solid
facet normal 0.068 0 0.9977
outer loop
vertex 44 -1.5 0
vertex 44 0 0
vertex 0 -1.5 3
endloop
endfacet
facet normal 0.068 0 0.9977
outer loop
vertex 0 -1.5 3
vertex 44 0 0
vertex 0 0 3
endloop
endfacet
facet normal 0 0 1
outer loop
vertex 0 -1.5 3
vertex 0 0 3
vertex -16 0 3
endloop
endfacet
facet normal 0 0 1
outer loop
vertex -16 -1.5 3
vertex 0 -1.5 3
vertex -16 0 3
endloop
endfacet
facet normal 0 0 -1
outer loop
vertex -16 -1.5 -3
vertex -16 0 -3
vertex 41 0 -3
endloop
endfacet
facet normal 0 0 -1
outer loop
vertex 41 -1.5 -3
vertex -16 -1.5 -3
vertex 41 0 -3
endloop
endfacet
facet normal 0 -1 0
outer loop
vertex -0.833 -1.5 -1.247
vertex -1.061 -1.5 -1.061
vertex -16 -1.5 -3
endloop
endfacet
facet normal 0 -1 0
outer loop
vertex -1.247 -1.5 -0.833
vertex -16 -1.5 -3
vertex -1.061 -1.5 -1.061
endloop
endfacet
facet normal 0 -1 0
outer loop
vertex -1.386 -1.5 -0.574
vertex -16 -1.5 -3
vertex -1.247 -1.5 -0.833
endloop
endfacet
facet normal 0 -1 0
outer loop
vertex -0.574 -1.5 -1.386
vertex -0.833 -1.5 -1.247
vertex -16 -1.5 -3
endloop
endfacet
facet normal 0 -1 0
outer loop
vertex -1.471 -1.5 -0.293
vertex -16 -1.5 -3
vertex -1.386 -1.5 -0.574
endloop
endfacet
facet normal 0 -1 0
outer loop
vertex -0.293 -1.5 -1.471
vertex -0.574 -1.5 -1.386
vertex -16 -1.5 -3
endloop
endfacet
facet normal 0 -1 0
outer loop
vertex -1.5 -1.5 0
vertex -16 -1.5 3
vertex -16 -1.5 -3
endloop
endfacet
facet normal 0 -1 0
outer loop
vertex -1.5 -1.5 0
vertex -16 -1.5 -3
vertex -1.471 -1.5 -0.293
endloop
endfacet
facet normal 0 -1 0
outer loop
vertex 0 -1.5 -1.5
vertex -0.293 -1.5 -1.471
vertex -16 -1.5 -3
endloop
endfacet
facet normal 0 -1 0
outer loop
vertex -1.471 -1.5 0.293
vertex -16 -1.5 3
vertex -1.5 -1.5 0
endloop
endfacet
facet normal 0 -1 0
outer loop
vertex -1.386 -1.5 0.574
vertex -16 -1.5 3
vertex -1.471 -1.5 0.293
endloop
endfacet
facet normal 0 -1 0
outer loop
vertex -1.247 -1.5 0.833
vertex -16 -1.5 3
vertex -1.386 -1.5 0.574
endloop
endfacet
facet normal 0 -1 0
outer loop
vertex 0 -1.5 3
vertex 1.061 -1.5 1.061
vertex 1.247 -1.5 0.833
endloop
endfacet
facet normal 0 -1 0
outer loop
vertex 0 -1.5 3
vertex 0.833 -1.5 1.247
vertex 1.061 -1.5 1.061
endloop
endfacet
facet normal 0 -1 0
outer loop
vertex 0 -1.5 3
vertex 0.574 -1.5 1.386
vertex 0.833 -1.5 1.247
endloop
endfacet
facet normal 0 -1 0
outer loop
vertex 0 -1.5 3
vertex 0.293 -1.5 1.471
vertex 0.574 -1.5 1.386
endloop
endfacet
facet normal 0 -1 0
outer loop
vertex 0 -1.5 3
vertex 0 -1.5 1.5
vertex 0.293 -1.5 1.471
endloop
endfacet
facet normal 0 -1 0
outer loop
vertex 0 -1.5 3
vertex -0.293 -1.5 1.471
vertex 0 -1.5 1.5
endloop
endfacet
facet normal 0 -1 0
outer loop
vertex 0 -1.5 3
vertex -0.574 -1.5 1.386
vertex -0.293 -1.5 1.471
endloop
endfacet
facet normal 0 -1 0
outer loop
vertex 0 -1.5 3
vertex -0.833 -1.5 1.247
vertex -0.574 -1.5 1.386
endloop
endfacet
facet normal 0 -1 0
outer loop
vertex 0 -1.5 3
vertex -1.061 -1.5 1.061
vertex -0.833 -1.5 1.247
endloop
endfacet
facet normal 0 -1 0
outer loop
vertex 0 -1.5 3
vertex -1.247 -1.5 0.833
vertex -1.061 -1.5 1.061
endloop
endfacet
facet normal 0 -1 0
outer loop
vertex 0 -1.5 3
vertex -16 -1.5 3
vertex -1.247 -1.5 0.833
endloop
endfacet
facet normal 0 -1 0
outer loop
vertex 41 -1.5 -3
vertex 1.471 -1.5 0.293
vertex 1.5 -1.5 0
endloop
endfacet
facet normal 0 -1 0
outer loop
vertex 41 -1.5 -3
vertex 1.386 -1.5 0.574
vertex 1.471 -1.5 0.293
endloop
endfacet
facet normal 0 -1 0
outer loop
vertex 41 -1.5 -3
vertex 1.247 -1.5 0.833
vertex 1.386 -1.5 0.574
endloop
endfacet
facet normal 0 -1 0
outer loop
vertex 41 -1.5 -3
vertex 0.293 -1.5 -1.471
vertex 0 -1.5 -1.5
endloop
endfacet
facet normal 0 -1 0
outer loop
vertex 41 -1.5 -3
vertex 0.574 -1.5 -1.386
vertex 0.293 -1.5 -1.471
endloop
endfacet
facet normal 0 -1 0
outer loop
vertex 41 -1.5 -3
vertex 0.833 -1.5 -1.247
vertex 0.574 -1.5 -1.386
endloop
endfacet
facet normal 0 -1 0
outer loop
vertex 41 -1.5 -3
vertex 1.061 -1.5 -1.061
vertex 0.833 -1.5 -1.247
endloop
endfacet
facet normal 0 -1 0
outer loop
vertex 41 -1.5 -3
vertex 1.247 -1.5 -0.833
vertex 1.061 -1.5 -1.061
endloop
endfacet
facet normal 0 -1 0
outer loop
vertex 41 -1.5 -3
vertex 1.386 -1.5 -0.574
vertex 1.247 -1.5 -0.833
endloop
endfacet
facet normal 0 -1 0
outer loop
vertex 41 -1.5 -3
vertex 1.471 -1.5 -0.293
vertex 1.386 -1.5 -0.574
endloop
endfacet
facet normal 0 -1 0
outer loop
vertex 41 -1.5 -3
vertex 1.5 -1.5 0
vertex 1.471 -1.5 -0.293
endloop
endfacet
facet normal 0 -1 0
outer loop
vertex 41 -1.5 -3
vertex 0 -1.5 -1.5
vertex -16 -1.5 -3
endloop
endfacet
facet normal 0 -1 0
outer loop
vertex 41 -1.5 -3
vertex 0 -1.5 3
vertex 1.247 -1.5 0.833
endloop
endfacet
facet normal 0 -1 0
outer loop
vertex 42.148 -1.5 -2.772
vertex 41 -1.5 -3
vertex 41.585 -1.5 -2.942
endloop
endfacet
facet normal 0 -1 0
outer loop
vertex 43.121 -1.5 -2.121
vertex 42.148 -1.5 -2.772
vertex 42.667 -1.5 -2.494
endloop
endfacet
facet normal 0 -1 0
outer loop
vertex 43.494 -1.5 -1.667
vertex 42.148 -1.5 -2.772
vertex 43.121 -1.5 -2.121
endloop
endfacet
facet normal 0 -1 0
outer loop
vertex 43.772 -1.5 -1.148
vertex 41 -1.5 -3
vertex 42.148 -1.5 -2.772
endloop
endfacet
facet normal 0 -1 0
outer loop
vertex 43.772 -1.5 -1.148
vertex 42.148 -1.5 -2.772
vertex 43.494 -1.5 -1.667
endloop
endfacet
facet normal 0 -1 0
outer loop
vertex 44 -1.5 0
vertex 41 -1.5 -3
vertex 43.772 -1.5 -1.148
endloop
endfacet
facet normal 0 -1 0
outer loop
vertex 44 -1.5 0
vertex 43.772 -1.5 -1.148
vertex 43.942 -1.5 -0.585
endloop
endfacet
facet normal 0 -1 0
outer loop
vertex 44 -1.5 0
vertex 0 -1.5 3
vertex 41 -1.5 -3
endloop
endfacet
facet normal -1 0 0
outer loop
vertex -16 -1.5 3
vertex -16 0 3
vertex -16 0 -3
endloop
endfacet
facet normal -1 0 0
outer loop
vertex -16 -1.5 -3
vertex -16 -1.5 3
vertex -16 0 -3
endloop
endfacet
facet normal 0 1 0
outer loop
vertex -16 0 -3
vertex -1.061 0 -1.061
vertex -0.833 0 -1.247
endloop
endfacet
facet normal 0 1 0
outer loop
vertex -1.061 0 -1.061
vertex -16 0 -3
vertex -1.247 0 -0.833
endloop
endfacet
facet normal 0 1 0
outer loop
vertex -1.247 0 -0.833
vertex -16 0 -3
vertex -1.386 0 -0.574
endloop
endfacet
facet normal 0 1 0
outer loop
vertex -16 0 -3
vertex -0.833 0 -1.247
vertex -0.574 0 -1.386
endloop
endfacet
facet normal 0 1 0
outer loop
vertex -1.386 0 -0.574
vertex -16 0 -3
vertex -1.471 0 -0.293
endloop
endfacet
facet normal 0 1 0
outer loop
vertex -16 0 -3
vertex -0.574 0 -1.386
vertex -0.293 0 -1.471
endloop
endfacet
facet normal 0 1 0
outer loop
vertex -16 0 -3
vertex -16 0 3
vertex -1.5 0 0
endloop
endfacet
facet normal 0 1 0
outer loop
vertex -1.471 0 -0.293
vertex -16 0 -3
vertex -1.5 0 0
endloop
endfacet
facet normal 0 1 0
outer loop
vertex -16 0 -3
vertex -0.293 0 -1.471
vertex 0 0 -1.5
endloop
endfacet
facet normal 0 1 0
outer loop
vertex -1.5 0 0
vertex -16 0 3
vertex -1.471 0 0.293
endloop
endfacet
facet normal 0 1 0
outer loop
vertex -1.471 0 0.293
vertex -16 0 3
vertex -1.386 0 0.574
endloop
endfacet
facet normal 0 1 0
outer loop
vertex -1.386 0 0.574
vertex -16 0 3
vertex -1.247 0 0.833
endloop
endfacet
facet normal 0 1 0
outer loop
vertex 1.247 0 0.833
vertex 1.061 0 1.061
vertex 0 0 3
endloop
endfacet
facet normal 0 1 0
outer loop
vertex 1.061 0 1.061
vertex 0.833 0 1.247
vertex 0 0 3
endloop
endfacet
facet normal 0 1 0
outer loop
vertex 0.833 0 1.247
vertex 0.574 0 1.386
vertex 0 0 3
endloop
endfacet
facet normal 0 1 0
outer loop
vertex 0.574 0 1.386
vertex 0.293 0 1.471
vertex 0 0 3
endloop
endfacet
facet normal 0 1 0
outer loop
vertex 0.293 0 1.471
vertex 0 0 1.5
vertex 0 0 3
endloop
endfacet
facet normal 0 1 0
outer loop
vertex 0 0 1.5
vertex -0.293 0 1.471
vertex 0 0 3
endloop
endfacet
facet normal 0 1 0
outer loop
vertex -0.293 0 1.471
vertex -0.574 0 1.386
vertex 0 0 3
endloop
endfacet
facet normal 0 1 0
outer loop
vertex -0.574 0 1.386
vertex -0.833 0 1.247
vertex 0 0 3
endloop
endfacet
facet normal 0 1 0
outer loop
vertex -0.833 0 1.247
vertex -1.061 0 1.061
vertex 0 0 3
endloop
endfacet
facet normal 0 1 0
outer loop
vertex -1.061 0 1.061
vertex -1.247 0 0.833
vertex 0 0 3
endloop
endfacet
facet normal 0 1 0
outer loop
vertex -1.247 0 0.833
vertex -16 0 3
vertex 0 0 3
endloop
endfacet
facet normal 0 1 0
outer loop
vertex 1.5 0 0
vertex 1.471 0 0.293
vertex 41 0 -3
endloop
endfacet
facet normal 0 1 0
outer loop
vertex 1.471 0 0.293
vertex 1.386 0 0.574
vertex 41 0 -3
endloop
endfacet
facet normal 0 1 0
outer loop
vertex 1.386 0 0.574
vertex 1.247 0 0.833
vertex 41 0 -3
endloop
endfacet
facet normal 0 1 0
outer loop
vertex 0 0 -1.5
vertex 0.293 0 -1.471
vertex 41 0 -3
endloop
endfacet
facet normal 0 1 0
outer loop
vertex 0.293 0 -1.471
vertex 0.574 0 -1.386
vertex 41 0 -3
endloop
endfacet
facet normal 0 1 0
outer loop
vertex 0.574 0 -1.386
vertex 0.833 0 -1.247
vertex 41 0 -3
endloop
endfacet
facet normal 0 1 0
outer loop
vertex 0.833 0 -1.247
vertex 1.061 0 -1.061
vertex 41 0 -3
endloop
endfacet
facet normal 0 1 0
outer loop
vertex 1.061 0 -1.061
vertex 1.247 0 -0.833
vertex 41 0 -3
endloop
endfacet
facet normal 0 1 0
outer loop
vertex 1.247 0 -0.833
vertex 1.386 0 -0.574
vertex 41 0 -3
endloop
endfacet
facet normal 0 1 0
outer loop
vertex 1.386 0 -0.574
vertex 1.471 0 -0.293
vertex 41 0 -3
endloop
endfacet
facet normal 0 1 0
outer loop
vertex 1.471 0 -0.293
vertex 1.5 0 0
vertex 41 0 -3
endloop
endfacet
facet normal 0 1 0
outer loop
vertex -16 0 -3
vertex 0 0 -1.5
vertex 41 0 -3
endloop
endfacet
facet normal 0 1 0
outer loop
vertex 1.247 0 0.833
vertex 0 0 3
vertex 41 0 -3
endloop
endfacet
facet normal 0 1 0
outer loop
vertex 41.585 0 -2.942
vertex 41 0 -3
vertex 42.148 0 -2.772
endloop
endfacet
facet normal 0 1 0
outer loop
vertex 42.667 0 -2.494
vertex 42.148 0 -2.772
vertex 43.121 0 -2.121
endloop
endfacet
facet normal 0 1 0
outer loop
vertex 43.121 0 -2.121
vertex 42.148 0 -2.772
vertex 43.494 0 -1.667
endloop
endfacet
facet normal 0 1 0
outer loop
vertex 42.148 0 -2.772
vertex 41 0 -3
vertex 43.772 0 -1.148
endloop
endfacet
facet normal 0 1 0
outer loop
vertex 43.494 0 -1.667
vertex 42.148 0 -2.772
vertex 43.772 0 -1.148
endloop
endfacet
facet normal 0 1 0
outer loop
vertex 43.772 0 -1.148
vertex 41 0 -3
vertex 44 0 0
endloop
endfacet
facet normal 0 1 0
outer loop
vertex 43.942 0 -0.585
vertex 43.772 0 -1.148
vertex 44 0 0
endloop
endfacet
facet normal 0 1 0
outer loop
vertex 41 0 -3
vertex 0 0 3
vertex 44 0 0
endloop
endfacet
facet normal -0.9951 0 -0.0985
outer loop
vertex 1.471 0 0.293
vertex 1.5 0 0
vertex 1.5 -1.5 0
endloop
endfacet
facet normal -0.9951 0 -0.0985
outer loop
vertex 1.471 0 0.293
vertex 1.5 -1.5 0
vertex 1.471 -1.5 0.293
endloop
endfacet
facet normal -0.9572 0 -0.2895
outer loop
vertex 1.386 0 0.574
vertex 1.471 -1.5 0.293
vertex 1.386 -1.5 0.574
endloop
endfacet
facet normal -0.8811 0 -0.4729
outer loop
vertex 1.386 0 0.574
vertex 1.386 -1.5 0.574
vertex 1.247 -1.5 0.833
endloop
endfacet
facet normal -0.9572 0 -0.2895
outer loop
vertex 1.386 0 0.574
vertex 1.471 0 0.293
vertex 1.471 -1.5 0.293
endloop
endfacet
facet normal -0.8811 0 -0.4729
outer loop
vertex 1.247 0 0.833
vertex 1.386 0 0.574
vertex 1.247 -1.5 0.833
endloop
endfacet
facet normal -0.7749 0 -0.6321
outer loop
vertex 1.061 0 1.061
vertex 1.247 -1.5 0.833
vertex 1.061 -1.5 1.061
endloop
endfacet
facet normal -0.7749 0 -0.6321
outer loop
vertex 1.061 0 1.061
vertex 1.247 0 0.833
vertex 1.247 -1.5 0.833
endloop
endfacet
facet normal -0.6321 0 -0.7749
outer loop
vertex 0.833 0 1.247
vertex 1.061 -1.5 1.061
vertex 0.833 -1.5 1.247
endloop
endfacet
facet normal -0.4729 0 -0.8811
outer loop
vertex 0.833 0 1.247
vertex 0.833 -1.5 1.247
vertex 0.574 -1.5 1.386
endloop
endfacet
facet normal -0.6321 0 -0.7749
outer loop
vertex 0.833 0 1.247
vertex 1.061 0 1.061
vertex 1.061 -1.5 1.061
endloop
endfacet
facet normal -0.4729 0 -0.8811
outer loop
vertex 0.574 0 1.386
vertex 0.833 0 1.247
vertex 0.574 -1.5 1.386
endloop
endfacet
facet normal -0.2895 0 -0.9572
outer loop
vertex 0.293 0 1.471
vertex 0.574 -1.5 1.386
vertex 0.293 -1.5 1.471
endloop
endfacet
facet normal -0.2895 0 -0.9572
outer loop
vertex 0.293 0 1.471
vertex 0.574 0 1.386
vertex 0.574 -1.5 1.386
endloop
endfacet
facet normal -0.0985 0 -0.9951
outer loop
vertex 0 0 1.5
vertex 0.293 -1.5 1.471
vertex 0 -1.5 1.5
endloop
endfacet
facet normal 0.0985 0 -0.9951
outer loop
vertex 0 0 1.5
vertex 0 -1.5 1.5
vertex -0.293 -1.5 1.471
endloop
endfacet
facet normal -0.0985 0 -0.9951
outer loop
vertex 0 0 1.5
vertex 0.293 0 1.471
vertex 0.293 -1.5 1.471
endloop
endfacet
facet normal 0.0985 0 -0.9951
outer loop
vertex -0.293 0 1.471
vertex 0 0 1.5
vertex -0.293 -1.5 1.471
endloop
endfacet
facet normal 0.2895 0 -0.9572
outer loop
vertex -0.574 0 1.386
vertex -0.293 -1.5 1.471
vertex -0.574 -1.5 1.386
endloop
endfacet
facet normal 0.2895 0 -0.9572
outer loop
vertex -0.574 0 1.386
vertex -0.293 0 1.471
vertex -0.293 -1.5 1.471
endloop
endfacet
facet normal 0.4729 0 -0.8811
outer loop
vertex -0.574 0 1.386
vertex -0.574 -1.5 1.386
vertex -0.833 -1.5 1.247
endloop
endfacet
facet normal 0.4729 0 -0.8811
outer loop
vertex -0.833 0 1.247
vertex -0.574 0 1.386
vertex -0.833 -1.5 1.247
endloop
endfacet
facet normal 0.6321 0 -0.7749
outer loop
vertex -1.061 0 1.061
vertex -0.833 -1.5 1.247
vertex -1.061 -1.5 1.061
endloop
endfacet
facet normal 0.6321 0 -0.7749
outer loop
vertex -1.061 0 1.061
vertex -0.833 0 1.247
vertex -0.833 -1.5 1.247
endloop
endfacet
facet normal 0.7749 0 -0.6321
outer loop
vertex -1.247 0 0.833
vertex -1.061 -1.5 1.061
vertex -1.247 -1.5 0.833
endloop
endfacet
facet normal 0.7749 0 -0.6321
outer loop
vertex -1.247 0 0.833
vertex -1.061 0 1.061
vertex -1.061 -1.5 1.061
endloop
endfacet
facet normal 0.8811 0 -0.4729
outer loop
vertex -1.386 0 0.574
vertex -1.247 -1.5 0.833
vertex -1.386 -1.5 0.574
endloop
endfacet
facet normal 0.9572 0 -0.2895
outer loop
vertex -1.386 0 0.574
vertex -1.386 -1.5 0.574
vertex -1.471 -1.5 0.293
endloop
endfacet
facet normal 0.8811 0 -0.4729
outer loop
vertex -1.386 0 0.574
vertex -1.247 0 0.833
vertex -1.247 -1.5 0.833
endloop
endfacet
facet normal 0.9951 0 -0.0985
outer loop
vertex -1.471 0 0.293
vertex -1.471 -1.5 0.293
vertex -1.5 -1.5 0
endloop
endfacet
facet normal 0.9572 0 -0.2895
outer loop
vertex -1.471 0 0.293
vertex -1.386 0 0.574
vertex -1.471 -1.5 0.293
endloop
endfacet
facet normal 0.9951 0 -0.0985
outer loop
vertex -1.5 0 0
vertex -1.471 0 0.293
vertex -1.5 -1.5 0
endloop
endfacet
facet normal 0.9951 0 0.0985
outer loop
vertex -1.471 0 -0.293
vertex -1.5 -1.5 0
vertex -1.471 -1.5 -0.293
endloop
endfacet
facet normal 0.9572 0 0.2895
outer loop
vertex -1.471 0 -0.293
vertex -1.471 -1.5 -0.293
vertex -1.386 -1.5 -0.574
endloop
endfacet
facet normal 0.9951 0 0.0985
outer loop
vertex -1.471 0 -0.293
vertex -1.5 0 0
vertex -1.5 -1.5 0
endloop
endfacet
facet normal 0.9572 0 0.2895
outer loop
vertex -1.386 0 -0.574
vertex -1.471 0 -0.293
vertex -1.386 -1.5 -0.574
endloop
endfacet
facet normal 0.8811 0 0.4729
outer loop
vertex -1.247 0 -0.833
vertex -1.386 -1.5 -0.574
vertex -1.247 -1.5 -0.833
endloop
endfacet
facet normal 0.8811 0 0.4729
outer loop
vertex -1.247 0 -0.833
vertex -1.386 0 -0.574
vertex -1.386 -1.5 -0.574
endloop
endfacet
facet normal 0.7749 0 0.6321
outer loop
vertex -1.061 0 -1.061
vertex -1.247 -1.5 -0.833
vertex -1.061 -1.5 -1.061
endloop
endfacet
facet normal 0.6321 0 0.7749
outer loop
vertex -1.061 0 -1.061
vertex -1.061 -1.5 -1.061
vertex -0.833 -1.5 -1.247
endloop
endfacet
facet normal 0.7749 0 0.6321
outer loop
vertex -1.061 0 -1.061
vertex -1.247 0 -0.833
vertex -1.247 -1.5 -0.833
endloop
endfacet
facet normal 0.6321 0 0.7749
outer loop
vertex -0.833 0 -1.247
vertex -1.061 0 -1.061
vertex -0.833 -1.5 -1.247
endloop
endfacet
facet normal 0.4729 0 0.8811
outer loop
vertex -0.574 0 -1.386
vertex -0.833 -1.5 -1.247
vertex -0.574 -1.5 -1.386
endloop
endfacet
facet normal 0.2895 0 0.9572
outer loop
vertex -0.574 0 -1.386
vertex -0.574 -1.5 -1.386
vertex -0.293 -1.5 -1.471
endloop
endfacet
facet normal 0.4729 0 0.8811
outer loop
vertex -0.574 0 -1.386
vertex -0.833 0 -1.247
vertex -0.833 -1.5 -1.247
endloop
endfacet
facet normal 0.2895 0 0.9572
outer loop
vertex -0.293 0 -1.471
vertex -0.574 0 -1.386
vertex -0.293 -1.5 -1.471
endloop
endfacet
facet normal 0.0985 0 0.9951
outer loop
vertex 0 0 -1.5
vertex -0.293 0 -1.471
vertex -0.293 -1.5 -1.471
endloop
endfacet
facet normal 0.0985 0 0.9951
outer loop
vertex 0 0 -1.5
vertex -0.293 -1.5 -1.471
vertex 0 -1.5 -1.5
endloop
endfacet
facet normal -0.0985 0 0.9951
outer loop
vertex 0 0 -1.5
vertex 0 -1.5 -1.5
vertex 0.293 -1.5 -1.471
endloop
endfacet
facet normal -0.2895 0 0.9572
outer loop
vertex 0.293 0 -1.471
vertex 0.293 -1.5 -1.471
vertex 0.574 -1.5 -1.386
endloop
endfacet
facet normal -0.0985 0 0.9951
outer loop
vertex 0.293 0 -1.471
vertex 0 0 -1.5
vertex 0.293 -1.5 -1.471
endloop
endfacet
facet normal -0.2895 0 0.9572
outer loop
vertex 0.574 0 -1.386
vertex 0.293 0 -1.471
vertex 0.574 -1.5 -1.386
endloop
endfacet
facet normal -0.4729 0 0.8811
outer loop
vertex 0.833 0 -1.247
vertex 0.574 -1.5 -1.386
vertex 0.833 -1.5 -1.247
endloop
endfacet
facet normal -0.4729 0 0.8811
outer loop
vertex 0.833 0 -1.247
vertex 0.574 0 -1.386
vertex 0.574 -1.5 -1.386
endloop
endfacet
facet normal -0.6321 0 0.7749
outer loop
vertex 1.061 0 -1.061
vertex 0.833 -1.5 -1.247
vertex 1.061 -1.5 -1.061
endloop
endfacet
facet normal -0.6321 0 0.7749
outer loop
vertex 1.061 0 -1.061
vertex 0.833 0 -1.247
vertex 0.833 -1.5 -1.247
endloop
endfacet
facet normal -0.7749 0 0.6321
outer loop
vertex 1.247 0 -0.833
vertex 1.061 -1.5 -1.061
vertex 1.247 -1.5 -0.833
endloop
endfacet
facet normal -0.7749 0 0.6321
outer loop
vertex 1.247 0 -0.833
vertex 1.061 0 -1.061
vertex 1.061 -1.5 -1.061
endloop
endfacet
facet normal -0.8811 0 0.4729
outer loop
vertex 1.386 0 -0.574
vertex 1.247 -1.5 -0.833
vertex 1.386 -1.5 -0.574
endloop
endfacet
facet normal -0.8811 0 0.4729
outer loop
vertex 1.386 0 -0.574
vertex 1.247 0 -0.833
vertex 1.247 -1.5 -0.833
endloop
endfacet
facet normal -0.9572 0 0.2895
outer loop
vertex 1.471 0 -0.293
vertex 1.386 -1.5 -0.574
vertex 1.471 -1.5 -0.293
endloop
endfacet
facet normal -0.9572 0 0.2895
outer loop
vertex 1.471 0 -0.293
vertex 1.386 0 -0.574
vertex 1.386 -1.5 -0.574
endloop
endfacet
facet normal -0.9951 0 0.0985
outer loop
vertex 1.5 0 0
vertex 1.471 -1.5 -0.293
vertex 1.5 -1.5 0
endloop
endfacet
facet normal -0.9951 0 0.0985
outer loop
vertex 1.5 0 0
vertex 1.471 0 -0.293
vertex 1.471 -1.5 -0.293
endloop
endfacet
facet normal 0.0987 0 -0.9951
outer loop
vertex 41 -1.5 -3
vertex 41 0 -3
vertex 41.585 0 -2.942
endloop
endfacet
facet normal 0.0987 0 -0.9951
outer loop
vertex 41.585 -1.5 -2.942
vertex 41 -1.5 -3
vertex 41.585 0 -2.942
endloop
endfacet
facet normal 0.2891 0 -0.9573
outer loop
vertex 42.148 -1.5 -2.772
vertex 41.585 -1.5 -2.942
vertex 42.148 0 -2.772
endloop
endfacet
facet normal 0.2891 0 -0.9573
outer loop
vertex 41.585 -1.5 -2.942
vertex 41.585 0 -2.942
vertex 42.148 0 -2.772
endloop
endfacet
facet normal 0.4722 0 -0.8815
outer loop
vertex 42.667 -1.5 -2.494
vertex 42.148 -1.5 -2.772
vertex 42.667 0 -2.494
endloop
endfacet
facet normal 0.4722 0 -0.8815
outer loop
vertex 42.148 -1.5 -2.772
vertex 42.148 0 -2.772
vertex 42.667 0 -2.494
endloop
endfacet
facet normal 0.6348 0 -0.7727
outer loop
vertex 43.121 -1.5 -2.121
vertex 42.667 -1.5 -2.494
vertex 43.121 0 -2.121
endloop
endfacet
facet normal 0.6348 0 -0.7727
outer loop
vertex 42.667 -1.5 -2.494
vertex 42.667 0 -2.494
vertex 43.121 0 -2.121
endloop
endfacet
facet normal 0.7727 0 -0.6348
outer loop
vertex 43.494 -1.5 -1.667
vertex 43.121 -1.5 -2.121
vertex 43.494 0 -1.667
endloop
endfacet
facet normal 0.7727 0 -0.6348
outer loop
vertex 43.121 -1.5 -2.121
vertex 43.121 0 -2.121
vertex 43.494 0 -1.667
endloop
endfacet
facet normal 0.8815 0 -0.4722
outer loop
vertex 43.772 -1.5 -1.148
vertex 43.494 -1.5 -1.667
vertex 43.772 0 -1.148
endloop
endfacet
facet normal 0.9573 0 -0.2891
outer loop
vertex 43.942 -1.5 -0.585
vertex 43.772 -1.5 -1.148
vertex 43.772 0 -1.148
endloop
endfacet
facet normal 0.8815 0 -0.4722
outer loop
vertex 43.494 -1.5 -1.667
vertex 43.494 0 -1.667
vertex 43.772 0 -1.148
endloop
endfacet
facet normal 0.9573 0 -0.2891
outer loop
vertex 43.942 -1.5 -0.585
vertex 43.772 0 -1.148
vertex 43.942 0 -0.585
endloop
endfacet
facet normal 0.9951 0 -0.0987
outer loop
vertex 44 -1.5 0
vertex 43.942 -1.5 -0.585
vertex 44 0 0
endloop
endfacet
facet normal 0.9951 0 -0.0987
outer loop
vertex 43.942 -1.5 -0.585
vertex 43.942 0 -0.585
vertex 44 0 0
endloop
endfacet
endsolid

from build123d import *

# Parameters (mm, degrees)
F0_R     = 1.5
F1_DEPTH = 1.5


with BuildPart() as f1:
    # F0 (on Front) → F1 (new body)
    with BuildSketch(Plane.XZ):
        with BuildLine():
            Line((0, 3), (-16, 3))
            Line((-16, 3), (-16, -3))
            Line((-16, -3), (41, -3))
            ThreePointArc((41, -3), (43.12132, -2.12132), (44, 0))
            Line((44, 0), (0, 3))
        make_face()
        Circle(F0_R, mode=Mode.SUBTRACT)
    extrude(amount=F1_DEPTH)


solid = f1.part
